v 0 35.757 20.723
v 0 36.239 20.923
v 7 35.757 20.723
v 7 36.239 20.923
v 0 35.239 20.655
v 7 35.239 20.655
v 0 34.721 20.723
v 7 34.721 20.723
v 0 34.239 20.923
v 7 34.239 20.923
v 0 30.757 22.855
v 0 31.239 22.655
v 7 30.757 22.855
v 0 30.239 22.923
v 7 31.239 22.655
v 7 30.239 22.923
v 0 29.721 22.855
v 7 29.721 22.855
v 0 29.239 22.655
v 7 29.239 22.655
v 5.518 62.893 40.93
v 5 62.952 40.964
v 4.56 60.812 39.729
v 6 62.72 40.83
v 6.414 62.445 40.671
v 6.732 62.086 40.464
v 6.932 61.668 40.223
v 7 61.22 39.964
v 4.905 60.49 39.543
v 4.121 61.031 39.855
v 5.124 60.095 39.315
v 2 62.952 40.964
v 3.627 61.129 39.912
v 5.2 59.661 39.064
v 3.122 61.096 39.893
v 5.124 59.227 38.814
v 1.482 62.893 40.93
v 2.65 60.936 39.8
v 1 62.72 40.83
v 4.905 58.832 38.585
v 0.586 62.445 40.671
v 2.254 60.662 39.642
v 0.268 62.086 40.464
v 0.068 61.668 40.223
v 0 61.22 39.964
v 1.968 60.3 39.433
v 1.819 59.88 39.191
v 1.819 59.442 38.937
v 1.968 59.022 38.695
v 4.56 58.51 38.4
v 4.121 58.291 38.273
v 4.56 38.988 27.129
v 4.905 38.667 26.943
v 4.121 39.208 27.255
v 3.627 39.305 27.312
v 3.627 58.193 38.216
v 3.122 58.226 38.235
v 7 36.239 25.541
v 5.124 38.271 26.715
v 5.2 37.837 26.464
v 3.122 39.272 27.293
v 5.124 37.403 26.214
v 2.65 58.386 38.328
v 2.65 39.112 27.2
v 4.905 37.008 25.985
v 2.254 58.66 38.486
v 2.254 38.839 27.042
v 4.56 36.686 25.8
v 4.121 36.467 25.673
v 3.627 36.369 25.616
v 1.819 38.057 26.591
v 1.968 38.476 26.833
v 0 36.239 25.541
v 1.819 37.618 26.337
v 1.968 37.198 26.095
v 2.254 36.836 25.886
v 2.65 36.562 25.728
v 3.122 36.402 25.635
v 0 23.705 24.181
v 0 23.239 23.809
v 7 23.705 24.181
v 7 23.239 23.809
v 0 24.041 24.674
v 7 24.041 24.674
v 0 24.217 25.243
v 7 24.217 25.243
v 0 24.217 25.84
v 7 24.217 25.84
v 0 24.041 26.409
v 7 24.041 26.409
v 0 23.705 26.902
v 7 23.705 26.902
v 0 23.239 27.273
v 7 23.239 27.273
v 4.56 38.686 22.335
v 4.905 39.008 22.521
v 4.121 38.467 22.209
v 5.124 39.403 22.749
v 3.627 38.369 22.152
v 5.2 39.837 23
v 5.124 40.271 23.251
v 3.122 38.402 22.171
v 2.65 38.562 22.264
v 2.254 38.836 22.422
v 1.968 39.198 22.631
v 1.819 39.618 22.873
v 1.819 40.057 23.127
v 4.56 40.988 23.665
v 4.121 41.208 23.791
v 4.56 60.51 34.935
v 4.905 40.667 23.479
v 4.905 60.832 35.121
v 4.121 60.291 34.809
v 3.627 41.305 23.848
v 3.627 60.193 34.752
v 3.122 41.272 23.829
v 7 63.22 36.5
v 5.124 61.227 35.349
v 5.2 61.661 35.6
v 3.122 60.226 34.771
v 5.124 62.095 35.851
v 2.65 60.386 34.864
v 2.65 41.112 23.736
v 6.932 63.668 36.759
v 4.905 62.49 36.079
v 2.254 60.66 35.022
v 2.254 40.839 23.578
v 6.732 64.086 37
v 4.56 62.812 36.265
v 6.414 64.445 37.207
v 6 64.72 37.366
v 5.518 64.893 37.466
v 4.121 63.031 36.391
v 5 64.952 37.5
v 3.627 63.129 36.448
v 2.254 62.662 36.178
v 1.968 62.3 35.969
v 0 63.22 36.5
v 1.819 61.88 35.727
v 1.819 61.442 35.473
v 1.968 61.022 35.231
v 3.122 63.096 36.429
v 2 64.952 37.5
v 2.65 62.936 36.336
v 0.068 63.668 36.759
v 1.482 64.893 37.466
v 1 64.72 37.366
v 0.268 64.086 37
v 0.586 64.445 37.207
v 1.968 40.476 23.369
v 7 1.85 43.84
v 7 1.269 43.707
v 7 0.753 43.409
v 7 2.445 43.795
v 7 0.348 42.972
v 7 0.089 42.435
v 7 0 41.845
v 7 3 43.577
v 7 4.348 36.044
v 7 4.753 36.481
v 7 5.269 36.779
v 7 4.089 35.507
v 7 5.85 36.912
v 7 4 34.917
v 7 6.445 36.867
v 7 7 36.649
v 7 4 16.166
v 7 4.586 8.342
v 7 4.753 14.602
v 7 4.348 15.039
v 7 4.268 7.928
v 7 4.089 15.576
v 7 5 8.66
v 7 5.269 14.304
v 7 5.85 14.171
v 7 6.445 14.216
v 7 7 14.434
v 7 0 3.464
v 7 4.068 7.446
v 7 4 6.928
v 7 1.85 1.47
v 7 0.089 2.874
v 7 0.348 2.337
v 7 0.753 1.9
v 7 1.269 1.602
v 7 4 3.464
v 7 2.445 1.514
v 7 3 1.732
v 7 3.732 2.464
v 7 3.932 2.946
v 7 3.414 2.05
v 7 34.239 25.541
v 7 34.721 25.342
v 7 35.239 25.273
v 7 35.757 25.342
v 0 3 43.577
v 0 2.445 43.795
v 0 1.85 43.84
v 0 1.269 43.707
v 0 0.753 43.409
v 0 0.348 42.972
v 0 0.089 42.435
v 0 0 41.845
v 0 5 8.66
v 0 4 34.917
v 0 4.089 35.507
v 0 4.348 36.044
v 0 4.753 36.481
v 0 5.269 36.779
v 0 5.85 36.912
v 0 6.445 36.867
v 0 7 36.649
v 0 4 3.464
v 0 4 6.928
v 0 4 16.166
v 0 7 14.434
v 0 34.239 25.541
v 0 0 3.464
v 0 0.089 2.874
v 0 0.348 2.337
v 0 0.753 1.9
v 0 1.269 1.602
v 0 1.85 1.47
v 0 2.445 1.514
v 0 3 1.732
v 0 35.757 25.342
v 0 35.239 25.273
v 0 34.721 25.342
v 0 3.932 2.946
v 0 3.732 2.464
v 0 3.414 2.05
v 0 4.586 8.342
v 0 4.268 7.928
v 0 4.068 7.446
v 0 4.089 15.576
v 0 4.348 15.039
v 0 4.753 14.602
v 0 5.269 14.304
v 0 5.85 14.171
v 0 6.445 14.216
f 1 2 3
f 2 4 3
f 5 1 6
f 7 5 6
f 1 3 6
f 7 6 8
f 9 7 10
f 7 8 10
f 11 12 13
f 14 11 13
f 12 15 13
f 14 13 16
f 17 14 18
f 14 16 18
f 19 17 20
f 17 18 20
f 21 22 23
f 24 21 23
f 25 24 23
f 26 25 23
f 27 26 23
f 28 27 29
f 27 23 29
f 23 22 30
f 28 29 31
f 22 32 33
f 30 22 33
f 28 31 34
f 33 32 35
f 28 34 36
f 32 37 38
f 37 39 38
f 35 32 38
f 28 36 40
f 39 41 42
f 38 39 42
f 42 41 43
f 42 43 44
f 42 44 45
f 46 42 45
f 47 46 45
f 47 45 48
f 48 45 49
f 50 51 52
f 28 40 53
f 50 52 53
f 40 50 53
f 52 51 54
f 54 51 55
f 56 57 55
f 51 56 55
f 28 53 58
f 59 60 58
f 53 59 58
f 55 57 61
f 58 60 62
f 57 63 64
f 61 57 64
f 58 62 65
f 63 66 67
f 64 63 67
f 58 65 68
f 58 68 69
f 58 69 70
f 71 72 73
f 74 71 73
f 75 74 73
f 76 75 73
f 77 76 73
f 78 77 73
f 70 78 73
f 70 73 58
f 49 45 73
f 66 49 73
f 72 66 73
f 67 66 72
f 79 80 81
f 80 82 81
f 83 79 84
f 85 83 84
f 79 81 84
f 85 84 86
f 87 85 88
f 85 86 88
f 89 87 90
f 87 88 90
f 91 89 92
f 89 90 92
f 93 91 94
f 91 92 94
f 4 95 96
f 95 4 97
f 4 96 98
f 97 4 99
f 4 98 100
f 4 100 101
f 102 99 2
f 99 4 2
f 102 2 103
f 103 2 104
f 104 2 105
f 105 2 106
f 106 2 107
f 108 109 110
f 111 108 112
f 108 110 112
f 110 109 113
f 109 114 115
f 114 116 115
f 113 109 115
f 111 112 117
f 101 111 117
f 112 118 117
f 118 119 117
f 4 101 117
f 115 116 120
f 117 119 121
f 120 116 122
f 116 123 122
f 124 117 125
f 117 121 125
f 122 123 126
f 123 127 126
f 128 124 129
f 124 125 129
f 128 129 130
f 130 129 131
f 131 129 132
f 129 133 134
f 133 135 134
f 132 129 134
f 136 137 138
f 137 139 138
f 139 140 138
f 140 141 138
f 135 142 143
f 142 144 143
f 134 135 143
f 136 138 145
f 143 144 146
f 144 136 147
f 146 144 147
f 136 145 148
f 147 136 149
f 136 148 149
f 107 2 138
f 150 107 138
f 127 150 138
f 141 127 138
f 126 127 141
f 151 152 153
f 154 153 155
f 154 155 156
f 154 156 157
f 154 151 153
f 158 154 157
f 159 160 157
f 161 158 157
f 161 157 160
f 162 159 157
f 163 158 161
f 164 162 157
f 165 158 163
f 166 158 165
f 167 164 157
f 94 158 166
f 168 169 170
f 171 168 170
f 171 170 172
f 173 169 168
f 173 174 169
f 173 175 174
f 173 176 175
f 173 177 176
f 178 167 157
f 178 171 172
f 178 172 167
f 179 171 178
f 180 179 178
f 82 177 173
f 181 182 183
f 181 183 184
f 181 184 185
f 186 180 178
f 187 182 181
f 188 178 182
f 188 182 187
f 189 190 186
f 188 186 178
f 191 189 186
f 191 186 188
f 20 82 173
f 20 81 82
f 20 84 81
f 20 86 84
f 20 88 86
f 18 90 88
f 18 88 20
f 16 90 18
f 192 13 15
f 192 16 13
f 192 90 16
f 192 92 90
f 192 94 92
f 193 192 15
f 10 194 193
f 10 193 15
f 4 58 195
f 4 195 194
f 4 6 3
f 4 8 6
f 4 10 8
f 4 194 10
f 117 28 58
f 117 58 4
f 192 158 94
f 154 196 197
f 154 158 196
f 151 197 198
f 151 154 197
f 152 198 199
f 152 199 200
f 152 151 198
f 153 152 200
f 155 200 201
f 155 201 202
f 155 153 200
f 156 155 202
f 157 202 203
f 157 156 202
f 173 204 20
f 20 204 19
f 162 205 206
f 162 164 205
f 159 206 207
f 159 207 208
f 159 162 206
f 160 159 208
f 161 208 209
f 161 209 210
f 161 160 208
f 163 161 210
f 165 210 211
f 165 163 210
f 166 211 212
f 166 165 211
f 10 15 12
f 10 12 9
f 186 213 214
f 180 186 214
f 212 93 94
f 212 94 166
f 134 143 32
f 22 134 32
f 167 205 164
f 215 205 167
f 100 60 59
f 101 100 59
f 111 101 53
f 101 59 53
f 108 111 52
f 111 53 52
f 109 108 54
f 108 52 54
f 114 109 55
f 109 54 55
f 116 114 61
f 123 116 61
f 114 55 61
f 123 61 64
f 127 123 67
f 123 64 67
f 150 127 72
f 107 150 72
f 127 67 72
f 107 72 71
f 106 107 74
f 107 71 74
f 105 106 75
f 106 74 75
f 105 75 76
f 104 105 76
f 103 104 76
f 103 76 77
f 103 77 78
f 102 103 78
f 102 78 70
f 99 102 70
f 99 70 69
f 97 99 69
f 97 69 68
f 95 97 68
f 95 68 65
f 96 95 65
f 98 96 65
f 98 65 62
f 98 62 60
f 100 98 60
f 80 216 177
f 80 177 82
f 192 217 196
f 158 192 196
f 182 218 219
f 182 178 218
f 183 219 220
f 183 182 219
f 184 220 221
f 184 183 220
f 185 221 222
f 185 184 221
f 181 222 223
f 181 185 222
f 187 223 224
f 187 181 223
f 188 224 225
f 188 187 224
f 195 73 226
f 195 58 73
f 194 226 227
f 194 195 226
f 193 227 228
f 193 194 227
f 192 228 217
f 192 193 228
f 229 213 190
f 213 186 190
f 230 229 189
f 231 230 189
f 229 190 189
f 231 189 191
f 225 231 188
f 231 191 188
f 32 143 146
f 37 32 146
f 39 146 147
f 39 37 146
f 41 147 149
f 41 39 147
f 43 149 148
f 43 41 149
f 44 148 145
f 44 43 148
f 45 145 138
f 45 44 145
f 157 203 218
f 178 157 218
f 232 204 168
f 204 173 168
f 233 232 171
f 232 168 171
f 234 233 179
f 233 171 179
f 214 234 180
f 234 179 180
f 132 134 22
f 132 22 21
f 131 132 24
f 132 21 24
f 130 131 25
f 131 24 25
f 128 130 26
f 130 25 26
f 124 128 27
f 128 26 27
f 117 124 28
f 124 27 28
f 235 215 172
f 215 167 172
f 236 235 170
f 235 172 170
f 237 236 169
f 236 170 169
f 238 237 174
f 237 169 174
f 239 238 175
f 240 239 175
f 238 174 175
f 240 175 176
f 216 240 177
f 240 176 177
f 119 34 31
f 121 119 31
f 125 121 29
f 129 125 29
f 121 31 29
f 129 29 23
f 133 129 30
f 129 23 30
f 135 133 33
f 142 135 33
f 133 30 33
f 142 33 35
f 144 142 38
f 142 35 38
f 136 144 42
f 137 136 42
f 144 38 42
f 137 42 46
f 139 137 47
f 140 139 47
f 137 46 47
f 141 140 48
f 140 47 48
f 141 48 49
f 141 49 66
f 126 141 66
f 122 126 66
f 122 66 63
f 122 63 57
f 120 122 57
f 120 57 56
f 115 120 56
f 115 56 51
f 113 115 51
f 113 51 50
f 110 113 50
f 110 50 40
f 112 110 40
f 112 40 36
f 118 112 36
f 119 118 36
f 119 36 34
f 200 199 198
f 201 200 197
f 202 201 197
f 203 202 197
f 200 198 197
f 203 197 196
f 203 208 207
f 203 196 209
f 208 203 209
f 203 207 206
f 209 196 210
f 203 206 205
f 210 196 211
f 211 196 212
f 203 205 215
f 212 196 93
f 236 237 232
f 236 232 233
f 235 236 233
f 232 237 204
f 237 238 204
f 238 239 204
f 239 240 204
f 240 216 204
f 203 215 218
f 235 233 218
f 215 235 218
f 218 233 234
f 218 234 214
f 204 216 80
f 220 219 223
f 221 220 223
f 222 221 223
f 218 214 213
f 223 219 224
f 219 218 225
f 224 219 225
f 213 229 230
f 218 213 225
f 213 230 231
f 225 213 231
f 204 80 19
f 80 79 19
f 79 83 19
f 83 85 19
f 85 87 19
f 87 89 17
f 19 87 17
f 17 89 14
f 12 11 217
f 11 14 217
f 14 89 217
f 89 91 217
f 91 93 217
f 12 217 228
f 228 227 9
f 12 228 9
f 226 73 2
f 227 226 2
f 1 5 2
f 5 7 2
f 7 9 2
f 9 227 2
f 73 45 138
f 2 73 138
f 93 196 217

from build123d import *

# Parameters (mm, degrees)
BOSS_EXTRU_1_DEPTH = 7
D_GAGEMENT_M31_D   = 3.4
CONG_1_R           = 2


with BuildPart() as part:
    # Esquisse1 → Boss.-Extru.1 (new body)
    with BuildSketch(Plane(origin=(0, 0, 0), x_dir=(0, 0, -1), z_dir=(1, 0, 0))):
        Polygon((-37.5, 64.951905284), (-40.964101615, 62.951905284), (-24.964101615, 35.239092363), (-45.309401077, 0), (0, 0), (-2.309401077, 4), (-8.082903769, 4), (-23.232050808, 30.239092363), (-20.345299462, 35.239092363), align=None)
        Polygon((-38.381197846, 4), (-12.701705922, 4), (-25.541451884, 26.239092363), align=None, mode=Mode.SUBTRACT)
    extrude(amount=BOSS_EXTRU_1_DEPTH)

    # Dégagement M31 (through all)
    with Locations(Plane(origin=(0, 0, 0), x_dir=(-1, 0, 0), z_dir=(0, 0.5000000000000047, -0.866025403784436))):
        with Locations((-3.5, 71.2), (-3.5, 46)):
            Hole(D_GAGEMENT_M31_D / 2)

    # Congé1
    cong_1_edges = [part.edges().sort_by_distance(p)[0] for p in [
        (0, 63.951905284, 39.232050808),
        (3.5, 0, 0),
        (3.5, 0, 45.309401077),
        (3.5, 35.239092363, 24.964101615),
        (3.5, 35.239092363, 20.345299462),
        (3.5, 30.239092363, 23.232050808),
        (3.5, 4, 8.082903769),
        (3.5, 4, 2.309401077),
        (7, 63.951905284, 39.232050808),
        (3.5, 26.239092363, 25.541451884),
        (3.5, 4, 38.381197846),
        (3.5, 4, 12.701705922),
    ]]
    fillet(cong_1_edges, radius=CONG_1_R - 0.0001)  # a hair under: the kernel refuses the full size


solid = part.part
